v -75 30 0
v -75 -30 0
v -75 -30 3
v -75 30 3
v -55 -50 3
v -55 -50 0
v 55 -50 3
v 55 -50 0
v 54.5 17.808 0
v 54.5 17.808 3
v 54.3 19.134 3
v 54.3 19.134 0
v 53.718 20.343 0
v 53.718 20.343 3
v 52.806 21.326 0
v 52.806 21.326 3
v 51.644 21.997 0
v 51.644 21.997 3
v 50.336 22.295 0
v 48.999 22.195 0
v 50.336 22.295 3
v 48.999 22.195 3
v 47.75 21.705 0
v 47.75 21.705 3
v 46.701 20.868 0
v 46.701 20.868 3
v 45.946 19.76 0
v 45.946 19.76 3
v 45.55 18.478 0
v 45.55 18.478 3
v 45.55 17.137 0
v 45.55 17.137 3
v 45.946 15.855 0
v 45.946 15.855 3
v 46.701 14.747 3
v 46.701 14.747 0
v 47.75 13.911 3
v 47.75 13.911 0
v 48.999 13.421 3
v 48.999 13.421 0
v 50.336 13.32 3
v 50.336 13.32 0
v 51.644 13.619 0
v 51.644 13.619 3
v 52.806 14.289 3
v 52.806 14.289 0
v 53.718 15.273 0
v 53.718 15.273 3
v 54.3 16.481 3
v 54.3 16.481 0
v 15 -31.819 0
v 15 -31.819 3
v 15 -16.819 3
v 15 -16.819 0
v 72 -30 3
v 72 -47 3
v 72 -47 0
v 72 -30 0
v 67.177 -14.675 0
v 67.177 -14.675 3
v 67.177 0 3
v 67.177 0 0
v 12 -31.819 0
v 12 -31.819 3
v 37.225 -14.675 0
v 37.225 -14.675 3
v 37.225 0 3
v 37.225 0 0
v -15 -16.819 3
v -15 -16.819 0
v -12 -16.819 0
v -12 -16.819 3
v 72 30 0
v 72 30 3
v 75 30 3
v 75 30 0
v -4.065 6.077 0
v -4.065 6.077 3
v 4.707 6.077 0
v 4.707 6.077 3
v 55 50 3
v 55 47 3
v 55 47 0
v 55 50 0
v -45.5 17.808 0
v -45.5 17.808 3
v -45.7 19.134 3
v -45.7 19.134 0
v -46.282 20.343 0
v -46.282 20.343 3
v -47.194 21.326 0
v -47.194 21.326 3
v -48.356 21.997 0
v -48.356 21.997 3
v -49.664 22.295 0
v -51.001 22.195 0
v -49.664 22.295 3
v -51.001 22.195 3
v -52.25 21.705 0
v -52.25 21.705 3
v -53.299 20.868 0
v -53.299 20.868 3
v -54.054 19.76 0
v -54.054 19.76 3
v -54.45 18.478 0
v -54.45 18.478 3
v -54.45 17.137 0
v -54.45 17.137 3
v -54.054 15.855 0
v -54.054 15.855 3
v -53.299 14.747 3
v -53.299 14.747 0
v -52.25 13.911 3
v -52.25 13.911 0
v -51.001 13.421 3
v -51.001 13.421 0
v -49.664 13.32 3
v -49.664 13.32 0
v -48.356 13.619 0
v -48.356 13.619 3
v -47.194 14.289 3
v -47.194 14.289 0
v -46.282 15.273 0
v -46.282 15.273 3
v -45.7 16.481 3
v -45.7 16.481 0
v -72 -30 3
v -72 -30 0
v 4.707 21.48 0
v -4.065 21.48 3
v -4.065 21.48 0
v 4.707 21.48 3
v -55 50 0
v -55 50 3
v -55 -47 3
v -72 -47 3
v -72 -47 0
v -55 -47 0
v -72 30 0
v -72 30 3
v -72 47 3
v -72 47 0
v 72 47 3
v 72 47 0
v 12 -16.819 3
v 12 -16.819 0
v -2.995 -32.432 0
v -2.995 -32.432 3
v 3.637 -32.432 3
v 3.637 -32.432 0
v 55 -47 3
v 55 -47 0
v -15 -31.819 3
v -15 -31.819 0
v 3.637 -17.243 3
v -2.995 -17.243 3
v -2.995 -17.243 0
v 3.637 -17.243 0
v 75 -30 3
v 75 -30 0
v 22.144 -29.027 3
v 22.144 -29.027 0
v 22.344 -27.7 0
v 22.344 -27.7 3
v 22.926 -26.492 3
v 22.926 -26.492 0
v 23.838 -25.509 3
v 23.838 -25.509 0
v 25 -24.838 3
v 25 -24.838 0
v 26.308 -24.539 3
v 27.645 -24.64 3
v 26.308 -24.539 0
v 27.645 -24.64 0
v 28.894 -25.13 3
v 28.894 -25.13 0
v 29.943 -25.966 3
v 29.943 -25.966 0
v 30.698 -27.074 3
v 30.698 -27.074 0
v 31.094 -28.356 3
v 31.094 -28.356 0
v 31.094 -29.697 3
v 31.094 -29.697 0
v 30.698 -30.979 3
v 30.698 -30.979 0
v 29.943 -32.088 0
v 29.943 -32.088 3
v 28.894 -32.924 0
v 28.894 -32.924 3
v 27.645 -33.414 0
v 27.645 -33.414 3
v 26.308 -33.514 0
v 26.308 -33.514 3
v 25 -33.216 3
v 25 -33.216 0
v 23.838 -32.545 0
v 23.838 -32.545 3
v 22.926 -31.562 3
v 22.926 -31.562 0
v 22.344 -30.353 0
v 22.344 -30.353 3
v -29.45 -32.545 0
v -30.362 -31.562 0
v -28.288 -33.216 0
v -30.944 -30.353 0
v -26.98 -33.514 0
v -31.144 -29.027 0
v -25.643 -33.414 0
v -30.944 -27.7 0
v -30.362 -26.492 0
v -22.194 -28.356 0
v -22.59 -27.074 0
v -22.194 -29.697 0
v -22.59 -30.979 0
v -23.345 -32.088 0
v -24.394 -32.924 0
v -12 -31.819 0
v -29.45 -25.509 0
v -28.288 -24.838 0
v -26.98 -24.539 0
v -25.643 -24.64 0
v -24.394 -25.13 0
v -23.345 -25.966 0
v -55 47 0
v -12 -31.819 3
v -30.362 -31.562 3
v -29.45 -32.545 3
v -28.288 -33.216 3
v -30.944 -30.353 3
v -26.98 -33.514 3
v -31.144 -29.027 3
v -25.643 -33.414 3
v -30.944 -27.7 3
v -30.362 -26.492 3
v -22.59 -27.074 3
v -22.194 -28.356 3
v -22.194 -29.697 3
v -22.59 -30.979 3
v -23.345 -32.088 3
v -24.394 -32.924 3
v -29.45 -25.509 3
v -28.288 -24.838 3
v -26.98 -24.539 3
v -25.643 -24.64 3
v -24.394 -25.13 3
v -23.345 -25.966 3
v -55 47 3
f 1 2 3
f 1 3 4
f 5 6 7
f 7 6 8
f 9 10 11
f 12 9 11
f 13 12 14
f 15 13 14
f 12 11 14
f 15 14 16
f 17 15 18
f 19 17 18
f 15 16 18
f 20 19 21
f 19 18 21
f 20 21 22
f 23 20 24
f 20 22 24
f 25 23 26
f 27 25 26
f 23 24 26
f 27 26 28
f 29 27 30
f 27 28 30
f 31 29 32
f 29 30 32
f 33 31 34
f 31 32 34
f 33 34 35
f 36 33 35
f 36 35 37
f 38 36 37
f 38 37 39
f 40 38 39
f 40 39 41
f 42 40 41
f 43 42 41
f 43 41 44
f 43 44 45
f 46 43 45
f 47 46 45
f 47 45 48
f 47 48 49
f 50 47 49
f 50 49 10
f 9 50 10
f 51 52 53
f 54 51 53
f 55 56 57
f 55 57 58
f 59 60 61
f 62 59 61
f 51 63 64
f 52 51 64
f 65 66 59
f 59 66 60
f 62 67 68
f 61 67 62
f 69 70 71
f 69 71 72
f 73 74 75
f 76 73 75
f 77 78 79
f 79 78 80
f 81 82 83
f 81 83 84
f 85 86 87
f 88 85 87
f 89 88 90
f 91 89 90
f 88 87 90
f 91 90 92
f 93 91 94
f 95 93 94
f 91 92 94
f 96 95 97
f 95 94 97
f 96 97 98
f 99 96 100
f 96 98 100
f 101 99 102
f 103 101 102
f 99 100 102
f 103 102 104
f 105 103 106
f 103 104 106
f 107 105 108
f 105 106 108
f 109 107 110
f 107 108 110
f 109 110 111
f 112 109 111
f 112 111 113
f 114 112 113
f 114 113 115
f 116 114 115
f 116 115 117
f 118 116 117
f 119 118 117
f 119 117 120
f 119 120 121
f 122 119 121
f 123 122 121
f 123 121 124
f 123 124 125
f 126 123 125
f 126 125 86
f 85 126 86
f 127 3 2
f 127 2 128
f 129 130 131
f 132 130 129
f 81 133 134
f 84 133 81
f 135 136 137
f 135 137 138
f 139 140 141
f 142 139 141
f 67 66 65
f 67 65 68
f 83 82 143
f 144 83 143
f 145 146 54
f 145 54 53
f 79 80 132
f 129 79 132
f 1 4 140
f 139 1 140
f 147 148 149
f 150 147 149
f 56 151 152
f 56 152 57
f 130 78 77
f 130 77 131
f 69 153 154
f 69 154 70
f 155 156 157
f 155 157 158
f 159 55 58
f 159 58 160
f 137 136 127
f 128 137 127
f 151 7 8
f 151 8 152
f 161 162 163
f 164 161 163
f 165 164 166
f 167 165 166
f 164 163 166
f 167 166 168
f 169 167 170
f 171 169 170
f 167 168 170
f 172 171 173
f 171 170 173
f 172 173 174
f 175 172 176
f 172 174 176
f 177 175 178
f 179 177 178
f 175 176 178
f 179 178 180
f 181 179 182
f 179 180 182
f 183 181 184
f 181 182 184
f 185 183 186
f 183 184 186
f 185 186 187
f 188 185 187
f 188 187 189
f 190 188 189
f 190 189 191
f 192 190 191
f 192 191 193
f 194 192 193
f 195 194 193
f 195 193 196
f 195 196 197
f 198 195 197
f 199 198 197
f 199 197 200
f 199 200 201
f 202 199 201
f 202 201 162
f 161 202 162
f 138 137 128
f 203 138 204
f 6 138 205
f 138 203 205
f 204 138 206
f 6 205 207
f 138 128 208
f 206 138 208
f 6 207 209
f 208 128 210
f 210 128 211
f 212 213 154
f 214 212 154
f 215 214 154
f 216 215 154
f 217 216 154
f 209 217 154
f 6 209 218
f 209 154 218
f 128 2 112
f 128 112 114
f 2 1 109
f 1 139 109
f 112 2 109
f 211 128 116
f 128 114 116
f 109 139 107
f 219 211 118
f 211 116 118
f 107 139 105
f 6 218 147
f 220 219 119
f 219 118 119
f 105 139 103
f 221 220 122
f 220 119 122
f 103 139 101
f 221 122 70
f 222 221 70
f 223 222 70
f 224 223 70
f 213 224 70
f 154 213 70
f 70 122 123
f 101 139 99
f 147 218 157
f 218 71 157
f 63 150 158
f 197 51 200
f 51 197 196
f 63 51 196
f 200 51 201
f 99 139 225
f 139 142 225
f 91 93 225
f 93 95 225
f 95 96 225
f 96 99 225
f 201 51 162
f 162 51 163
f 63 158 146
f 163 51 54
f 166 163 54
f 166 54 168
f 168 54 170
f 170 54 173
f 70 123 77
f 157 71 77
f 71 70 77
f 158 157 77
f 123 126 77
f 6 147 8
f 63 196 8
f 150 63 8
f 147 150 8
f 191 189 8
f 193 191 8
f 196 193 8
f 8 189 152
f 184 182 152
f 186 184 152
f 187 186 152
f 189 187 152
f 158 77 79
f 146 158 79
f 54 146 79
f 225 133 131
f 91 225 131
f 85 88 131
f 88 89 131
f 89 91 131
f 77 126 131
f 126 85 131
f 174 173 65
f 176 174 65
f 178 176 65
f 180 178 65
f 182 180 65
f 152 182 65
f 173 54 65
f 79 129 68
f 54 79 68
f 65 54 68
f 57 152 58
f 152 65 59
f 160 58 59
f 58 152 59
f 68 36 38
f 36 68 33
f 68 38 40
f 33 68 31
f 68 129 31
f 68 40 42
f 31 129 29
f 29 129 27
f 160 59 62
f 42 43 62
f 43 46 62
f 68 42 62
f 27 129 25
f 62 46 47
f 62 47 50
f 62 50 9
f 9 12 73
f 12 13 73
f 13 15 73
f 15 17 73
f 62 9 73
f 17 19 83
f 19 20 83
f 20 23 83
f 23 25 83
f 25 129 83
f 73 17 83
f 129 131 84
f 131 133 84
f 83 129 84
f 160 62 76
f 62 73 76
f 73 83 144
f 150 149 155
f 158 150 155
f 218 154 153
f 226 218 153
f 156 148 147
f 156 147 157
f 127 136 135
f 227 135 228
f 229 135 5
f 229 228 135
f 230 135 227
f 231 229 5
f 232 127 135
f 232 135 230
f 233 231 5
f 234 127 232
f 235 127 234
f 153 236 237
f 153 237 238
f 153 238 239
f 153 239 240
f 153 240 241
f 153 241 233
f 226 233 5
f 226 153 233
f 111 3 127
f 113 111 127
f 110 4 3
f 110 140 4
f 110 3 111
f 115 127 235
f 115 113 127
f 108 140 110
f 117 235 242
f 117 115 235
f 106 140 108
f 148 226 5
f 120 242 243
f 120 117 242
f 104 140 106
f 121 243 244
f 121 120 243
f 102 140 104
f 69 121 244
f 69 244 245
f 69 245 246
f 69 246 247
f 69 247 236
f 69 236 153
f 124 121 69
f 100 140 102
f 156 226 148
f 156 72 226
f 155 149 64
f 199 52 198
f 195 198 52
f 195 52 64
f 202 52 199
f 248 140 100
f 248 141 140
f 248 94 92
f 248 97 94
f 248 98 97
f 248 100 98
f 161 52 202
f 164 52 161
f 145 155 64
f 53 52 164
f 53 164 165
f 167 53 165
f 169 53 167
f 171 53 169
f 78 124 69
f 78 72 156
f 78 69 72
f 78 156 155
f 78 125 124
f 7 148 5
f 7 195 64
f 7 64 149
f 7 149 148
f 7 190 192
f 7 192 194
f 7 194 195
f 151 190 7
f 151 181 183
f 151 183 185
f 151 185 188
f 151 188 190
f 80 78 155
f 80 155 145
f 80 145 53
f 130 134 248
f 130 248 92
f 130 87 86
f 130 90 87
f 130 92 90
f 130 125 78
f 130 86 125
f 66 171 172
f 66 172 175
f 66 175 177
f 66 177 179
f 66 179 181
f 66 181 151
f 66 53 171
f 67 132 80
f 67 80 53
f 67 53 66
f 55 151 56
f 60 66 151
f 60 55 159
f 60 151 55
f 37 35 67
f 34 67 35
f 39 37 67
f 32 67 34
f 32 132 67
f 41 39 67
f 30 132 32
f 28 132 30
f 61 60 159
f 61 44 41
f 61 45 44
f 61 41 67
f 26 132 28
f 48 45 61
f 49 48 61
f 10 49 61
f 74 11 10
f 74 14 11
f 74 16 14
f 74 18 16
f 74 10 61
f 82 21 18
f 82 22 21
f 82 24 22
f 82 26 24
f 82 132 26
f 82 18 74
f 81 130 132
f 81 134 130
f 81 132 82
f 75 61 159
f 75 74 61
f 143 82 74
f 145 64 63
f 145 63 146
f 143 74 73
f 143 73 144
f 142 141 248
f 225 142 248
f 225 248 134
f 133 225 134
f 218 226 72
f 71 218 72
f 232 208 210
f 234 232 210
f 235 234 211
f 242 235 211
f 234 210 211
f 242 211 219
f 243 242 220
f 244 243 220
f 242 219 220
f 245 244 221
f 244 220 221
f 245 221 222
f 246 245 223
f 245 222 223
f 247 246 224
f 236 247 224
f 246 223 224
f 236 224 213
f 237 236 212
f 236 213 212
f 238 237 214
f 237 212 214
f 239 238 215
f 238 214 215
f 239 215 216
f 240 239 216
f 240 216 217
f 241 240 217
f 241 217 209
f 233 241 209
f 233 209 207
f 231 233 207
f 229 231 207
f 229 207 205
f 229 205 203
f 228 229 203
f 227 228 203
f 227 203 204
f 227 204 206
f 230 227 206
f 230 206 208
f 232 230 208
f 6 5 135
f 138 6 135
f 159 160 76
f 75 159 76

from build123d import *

# Parameters (mm, degrees)
SKETCH1_W           = 150
SKETCH1_H           = 100
BOSS_EXTRUDE1_DEPTH = 3
SKETCH2_W           = 20
SKETCH2_H           = 3
CUT_EXTRUDE1_DEPTH  = 3
SKETCH3_W           = 3
SKETCH3_H           = 17
CUT_EXTRUDE2_DEPTH  = 3
SKETCH5_R           = 4.5
CUT_EXTRUDE4_DEPTH  = 30.5
SKETCH6_R           = 4.5
CUT_EXTRUDE5_DEPTH  = 10
SKETCH7_R           = 1
CUT_EXTRUDE6_DEPTH  = 10
SKETCH9_W           = 29.951530893
SKETCH9_H           = 14.675464834
CUT_EXTRUDE7_DEPTH  = 10
SKETCH10_W          = 6.632124697
SKETCH10_H          = 15.189704953
CUT_EXTRUDE8_DEPTH  = 10
CAVITY1_START       = -15
CAVITY1_OUTLINE_W   = 15
CAVITY1_OUTLINE_H   = 3
CAVITY1_DEPTH       = 3
CAVITY1_START_2     = 12
CAVITY1_2_OUTLINE_W = 15
CAVITY1_2_OUTLINE_H = 3
CAVITY1_2_DEPTH     = 3
SKETCH11_W          = 8.771519761
SKETCH11_H          = 15.403644459
CUT_EXTRUDE9_DEPTH  = 10


# Read off the part's stored shape, not the designer's step: Cavity1
with BuildPart() as part:
    # Sketch1 → Boss-Extrude1 (new body)
    with BuildSketch(Plane.XY):
        Rectangle(SKETCH1_W, SKETCH1_H)
    extrude(amount=BOSS_EXTRUDE1_DEPTH)

    # Sketch2 → Cut-Extrude1 (cut)
    with BuildSketch(Plane.XY.offset(3)):
        with Locations((65, 48.5)):
            Rectangle(SKETCH2_W, SKETCH2_H)
        with Locations((-65, 48.5)):
            Rectangle(SKETCH2_W, SKETCH2_H)
        with Locations((-65, -48.5)):
            Rectangle(SKETCH2_W, SKETCH2_H)
        with Locations((65, -48.5)):
            Rectangle(SKETCH2_W, SKETCH2_H)
    extrude(amount=-CUT_EXTRUDE1_DEPTH, mode=Mode.SUBTRACT)

    # Sketch3 → Cut-Extrude2 (cut)
    with BuildSketch(Plane.XY.offset(3)):
        with Locations((-73.5, 38.5)):
            Rectangle(SKETCH3_W, SKETCH3_H)
        with Locations((-73.5, -38.5)):
            Rectangle(SKETCH3_W, SKETCH3_H)
        with Locations((73.5, 38.5)):
            Rectangle(SKETCH3_W, SKETCH3_H)
        with Locations((73.5, -38.5)):
            Rectangle(SKETCH3_W, SKETCH3_H)
    extrude(amount=-CUT_EXTRUDE2_DEPTH, mode=Mode.SUBTRACT)

    # Sketch5 → Cut-Extrude4 (cut)
    with BuildSketch(Plane.XY.offset(3)):
        with Locations((50, 17.807715926)):
            Circle(SKETCH5_R)
        with Locations((-50, 17.807715926)):
            Circle(SKETCH5_R)
    extrude(amount=-CUT_EXTRUDE4_DEPTH, mode=Mode.SUBTRACT)

    # Sketch6 → Cut-Extrude5 (cut)
    with BuildSketch(Plane(origin=(0, 0, 0), x_dir=(-1, 0, 0), z_dir=(0, 0, -1))):
        with Locations((26.644067797, -29.026784983)):
            Circle(SKETCH6_R)
        with Locations((-26.644067797, -29.026784983)):
            Circle(SKETCH6_R)
    extrude(amount=-CUT_EXTRUDE5_DEPTH, mode=Mode.SUBTRACT)

    # Sketch7 → Cut-Extrude6 (cut)
    with BuildSketch(Plane.XY.offset(3)):
        with Locations((0, 18.473215017)):
            Circle(SKETCH7_R)
        with Locations((0, -29.026784983)):
            Circle(SKETCH7_R)
    extrude(amount=-CUT_EXTRUDE6_DEPTH, mode=Mode.SUBTRACT)

    # Sketch9 → Cut-Extrude7 (cut)
    with BuildSketch(Plane.XY.offset(3)):
        with Locations((52.201239556, -7.337732417)):
            Rectangle(SKETCH9_W, SKETCH9_H)
    extrude(amount=-CUT_EXTRUDE7_DEPTH, mode=Mode.SUBTRACT)

    # Sketch10 → Cut-Extrude8 (cut)
    with BuildSketch(Plane.XY.offset(3)):
        with Locations((0.32090926, -24.837591387)):
            Rectangle(SKETCH10_W, SKETCH10_H)
    extrude(amount=-CUT_EXTRUDE8_DEPTH, mode=Mode.SUBTRACT)

    # Cavity1 outline → Cavity1 (cut)
    with BuildSketch(Plane.YZ.offset(CAVITY1_START)):
        with Locations((-24.318956618, 1.5)):
            Rectangle(CAVITY1_OUTLINE_W, CAVITY1_OUTLINE_H)
    extrude(amount=CAVITY1_DEPTH, mode=Mode.SUBTRACT)

    # Cavity1 2 outline → Cavity1 2 (cut)
    with BuildSketch(Plane.YZ.offset(CAVITY1_START_2)):
        with Locations((-24.318956618, 1.5)):
            Rectangle(CAVITY1_2_OUTLINE_W, CAVITY1_2_OUTLINE_H)
    extrude(amount=CAVITY1_2_DEPTH, mode=Mode.SUBTRACT)

    # Sketch11 → Cut-Extrude9 (cut)
    with BuildSketch(Plane.XY.offset(3)):
        with Locations((0.32090926, 13.778489515)):
            Rectangle(SKETCH11_W, SKETCH11_H)
    extrude(amount=-CUT_EXTRUDE9_DEPTH, mode=Mode.SUBTRACT)


solid = part.part
